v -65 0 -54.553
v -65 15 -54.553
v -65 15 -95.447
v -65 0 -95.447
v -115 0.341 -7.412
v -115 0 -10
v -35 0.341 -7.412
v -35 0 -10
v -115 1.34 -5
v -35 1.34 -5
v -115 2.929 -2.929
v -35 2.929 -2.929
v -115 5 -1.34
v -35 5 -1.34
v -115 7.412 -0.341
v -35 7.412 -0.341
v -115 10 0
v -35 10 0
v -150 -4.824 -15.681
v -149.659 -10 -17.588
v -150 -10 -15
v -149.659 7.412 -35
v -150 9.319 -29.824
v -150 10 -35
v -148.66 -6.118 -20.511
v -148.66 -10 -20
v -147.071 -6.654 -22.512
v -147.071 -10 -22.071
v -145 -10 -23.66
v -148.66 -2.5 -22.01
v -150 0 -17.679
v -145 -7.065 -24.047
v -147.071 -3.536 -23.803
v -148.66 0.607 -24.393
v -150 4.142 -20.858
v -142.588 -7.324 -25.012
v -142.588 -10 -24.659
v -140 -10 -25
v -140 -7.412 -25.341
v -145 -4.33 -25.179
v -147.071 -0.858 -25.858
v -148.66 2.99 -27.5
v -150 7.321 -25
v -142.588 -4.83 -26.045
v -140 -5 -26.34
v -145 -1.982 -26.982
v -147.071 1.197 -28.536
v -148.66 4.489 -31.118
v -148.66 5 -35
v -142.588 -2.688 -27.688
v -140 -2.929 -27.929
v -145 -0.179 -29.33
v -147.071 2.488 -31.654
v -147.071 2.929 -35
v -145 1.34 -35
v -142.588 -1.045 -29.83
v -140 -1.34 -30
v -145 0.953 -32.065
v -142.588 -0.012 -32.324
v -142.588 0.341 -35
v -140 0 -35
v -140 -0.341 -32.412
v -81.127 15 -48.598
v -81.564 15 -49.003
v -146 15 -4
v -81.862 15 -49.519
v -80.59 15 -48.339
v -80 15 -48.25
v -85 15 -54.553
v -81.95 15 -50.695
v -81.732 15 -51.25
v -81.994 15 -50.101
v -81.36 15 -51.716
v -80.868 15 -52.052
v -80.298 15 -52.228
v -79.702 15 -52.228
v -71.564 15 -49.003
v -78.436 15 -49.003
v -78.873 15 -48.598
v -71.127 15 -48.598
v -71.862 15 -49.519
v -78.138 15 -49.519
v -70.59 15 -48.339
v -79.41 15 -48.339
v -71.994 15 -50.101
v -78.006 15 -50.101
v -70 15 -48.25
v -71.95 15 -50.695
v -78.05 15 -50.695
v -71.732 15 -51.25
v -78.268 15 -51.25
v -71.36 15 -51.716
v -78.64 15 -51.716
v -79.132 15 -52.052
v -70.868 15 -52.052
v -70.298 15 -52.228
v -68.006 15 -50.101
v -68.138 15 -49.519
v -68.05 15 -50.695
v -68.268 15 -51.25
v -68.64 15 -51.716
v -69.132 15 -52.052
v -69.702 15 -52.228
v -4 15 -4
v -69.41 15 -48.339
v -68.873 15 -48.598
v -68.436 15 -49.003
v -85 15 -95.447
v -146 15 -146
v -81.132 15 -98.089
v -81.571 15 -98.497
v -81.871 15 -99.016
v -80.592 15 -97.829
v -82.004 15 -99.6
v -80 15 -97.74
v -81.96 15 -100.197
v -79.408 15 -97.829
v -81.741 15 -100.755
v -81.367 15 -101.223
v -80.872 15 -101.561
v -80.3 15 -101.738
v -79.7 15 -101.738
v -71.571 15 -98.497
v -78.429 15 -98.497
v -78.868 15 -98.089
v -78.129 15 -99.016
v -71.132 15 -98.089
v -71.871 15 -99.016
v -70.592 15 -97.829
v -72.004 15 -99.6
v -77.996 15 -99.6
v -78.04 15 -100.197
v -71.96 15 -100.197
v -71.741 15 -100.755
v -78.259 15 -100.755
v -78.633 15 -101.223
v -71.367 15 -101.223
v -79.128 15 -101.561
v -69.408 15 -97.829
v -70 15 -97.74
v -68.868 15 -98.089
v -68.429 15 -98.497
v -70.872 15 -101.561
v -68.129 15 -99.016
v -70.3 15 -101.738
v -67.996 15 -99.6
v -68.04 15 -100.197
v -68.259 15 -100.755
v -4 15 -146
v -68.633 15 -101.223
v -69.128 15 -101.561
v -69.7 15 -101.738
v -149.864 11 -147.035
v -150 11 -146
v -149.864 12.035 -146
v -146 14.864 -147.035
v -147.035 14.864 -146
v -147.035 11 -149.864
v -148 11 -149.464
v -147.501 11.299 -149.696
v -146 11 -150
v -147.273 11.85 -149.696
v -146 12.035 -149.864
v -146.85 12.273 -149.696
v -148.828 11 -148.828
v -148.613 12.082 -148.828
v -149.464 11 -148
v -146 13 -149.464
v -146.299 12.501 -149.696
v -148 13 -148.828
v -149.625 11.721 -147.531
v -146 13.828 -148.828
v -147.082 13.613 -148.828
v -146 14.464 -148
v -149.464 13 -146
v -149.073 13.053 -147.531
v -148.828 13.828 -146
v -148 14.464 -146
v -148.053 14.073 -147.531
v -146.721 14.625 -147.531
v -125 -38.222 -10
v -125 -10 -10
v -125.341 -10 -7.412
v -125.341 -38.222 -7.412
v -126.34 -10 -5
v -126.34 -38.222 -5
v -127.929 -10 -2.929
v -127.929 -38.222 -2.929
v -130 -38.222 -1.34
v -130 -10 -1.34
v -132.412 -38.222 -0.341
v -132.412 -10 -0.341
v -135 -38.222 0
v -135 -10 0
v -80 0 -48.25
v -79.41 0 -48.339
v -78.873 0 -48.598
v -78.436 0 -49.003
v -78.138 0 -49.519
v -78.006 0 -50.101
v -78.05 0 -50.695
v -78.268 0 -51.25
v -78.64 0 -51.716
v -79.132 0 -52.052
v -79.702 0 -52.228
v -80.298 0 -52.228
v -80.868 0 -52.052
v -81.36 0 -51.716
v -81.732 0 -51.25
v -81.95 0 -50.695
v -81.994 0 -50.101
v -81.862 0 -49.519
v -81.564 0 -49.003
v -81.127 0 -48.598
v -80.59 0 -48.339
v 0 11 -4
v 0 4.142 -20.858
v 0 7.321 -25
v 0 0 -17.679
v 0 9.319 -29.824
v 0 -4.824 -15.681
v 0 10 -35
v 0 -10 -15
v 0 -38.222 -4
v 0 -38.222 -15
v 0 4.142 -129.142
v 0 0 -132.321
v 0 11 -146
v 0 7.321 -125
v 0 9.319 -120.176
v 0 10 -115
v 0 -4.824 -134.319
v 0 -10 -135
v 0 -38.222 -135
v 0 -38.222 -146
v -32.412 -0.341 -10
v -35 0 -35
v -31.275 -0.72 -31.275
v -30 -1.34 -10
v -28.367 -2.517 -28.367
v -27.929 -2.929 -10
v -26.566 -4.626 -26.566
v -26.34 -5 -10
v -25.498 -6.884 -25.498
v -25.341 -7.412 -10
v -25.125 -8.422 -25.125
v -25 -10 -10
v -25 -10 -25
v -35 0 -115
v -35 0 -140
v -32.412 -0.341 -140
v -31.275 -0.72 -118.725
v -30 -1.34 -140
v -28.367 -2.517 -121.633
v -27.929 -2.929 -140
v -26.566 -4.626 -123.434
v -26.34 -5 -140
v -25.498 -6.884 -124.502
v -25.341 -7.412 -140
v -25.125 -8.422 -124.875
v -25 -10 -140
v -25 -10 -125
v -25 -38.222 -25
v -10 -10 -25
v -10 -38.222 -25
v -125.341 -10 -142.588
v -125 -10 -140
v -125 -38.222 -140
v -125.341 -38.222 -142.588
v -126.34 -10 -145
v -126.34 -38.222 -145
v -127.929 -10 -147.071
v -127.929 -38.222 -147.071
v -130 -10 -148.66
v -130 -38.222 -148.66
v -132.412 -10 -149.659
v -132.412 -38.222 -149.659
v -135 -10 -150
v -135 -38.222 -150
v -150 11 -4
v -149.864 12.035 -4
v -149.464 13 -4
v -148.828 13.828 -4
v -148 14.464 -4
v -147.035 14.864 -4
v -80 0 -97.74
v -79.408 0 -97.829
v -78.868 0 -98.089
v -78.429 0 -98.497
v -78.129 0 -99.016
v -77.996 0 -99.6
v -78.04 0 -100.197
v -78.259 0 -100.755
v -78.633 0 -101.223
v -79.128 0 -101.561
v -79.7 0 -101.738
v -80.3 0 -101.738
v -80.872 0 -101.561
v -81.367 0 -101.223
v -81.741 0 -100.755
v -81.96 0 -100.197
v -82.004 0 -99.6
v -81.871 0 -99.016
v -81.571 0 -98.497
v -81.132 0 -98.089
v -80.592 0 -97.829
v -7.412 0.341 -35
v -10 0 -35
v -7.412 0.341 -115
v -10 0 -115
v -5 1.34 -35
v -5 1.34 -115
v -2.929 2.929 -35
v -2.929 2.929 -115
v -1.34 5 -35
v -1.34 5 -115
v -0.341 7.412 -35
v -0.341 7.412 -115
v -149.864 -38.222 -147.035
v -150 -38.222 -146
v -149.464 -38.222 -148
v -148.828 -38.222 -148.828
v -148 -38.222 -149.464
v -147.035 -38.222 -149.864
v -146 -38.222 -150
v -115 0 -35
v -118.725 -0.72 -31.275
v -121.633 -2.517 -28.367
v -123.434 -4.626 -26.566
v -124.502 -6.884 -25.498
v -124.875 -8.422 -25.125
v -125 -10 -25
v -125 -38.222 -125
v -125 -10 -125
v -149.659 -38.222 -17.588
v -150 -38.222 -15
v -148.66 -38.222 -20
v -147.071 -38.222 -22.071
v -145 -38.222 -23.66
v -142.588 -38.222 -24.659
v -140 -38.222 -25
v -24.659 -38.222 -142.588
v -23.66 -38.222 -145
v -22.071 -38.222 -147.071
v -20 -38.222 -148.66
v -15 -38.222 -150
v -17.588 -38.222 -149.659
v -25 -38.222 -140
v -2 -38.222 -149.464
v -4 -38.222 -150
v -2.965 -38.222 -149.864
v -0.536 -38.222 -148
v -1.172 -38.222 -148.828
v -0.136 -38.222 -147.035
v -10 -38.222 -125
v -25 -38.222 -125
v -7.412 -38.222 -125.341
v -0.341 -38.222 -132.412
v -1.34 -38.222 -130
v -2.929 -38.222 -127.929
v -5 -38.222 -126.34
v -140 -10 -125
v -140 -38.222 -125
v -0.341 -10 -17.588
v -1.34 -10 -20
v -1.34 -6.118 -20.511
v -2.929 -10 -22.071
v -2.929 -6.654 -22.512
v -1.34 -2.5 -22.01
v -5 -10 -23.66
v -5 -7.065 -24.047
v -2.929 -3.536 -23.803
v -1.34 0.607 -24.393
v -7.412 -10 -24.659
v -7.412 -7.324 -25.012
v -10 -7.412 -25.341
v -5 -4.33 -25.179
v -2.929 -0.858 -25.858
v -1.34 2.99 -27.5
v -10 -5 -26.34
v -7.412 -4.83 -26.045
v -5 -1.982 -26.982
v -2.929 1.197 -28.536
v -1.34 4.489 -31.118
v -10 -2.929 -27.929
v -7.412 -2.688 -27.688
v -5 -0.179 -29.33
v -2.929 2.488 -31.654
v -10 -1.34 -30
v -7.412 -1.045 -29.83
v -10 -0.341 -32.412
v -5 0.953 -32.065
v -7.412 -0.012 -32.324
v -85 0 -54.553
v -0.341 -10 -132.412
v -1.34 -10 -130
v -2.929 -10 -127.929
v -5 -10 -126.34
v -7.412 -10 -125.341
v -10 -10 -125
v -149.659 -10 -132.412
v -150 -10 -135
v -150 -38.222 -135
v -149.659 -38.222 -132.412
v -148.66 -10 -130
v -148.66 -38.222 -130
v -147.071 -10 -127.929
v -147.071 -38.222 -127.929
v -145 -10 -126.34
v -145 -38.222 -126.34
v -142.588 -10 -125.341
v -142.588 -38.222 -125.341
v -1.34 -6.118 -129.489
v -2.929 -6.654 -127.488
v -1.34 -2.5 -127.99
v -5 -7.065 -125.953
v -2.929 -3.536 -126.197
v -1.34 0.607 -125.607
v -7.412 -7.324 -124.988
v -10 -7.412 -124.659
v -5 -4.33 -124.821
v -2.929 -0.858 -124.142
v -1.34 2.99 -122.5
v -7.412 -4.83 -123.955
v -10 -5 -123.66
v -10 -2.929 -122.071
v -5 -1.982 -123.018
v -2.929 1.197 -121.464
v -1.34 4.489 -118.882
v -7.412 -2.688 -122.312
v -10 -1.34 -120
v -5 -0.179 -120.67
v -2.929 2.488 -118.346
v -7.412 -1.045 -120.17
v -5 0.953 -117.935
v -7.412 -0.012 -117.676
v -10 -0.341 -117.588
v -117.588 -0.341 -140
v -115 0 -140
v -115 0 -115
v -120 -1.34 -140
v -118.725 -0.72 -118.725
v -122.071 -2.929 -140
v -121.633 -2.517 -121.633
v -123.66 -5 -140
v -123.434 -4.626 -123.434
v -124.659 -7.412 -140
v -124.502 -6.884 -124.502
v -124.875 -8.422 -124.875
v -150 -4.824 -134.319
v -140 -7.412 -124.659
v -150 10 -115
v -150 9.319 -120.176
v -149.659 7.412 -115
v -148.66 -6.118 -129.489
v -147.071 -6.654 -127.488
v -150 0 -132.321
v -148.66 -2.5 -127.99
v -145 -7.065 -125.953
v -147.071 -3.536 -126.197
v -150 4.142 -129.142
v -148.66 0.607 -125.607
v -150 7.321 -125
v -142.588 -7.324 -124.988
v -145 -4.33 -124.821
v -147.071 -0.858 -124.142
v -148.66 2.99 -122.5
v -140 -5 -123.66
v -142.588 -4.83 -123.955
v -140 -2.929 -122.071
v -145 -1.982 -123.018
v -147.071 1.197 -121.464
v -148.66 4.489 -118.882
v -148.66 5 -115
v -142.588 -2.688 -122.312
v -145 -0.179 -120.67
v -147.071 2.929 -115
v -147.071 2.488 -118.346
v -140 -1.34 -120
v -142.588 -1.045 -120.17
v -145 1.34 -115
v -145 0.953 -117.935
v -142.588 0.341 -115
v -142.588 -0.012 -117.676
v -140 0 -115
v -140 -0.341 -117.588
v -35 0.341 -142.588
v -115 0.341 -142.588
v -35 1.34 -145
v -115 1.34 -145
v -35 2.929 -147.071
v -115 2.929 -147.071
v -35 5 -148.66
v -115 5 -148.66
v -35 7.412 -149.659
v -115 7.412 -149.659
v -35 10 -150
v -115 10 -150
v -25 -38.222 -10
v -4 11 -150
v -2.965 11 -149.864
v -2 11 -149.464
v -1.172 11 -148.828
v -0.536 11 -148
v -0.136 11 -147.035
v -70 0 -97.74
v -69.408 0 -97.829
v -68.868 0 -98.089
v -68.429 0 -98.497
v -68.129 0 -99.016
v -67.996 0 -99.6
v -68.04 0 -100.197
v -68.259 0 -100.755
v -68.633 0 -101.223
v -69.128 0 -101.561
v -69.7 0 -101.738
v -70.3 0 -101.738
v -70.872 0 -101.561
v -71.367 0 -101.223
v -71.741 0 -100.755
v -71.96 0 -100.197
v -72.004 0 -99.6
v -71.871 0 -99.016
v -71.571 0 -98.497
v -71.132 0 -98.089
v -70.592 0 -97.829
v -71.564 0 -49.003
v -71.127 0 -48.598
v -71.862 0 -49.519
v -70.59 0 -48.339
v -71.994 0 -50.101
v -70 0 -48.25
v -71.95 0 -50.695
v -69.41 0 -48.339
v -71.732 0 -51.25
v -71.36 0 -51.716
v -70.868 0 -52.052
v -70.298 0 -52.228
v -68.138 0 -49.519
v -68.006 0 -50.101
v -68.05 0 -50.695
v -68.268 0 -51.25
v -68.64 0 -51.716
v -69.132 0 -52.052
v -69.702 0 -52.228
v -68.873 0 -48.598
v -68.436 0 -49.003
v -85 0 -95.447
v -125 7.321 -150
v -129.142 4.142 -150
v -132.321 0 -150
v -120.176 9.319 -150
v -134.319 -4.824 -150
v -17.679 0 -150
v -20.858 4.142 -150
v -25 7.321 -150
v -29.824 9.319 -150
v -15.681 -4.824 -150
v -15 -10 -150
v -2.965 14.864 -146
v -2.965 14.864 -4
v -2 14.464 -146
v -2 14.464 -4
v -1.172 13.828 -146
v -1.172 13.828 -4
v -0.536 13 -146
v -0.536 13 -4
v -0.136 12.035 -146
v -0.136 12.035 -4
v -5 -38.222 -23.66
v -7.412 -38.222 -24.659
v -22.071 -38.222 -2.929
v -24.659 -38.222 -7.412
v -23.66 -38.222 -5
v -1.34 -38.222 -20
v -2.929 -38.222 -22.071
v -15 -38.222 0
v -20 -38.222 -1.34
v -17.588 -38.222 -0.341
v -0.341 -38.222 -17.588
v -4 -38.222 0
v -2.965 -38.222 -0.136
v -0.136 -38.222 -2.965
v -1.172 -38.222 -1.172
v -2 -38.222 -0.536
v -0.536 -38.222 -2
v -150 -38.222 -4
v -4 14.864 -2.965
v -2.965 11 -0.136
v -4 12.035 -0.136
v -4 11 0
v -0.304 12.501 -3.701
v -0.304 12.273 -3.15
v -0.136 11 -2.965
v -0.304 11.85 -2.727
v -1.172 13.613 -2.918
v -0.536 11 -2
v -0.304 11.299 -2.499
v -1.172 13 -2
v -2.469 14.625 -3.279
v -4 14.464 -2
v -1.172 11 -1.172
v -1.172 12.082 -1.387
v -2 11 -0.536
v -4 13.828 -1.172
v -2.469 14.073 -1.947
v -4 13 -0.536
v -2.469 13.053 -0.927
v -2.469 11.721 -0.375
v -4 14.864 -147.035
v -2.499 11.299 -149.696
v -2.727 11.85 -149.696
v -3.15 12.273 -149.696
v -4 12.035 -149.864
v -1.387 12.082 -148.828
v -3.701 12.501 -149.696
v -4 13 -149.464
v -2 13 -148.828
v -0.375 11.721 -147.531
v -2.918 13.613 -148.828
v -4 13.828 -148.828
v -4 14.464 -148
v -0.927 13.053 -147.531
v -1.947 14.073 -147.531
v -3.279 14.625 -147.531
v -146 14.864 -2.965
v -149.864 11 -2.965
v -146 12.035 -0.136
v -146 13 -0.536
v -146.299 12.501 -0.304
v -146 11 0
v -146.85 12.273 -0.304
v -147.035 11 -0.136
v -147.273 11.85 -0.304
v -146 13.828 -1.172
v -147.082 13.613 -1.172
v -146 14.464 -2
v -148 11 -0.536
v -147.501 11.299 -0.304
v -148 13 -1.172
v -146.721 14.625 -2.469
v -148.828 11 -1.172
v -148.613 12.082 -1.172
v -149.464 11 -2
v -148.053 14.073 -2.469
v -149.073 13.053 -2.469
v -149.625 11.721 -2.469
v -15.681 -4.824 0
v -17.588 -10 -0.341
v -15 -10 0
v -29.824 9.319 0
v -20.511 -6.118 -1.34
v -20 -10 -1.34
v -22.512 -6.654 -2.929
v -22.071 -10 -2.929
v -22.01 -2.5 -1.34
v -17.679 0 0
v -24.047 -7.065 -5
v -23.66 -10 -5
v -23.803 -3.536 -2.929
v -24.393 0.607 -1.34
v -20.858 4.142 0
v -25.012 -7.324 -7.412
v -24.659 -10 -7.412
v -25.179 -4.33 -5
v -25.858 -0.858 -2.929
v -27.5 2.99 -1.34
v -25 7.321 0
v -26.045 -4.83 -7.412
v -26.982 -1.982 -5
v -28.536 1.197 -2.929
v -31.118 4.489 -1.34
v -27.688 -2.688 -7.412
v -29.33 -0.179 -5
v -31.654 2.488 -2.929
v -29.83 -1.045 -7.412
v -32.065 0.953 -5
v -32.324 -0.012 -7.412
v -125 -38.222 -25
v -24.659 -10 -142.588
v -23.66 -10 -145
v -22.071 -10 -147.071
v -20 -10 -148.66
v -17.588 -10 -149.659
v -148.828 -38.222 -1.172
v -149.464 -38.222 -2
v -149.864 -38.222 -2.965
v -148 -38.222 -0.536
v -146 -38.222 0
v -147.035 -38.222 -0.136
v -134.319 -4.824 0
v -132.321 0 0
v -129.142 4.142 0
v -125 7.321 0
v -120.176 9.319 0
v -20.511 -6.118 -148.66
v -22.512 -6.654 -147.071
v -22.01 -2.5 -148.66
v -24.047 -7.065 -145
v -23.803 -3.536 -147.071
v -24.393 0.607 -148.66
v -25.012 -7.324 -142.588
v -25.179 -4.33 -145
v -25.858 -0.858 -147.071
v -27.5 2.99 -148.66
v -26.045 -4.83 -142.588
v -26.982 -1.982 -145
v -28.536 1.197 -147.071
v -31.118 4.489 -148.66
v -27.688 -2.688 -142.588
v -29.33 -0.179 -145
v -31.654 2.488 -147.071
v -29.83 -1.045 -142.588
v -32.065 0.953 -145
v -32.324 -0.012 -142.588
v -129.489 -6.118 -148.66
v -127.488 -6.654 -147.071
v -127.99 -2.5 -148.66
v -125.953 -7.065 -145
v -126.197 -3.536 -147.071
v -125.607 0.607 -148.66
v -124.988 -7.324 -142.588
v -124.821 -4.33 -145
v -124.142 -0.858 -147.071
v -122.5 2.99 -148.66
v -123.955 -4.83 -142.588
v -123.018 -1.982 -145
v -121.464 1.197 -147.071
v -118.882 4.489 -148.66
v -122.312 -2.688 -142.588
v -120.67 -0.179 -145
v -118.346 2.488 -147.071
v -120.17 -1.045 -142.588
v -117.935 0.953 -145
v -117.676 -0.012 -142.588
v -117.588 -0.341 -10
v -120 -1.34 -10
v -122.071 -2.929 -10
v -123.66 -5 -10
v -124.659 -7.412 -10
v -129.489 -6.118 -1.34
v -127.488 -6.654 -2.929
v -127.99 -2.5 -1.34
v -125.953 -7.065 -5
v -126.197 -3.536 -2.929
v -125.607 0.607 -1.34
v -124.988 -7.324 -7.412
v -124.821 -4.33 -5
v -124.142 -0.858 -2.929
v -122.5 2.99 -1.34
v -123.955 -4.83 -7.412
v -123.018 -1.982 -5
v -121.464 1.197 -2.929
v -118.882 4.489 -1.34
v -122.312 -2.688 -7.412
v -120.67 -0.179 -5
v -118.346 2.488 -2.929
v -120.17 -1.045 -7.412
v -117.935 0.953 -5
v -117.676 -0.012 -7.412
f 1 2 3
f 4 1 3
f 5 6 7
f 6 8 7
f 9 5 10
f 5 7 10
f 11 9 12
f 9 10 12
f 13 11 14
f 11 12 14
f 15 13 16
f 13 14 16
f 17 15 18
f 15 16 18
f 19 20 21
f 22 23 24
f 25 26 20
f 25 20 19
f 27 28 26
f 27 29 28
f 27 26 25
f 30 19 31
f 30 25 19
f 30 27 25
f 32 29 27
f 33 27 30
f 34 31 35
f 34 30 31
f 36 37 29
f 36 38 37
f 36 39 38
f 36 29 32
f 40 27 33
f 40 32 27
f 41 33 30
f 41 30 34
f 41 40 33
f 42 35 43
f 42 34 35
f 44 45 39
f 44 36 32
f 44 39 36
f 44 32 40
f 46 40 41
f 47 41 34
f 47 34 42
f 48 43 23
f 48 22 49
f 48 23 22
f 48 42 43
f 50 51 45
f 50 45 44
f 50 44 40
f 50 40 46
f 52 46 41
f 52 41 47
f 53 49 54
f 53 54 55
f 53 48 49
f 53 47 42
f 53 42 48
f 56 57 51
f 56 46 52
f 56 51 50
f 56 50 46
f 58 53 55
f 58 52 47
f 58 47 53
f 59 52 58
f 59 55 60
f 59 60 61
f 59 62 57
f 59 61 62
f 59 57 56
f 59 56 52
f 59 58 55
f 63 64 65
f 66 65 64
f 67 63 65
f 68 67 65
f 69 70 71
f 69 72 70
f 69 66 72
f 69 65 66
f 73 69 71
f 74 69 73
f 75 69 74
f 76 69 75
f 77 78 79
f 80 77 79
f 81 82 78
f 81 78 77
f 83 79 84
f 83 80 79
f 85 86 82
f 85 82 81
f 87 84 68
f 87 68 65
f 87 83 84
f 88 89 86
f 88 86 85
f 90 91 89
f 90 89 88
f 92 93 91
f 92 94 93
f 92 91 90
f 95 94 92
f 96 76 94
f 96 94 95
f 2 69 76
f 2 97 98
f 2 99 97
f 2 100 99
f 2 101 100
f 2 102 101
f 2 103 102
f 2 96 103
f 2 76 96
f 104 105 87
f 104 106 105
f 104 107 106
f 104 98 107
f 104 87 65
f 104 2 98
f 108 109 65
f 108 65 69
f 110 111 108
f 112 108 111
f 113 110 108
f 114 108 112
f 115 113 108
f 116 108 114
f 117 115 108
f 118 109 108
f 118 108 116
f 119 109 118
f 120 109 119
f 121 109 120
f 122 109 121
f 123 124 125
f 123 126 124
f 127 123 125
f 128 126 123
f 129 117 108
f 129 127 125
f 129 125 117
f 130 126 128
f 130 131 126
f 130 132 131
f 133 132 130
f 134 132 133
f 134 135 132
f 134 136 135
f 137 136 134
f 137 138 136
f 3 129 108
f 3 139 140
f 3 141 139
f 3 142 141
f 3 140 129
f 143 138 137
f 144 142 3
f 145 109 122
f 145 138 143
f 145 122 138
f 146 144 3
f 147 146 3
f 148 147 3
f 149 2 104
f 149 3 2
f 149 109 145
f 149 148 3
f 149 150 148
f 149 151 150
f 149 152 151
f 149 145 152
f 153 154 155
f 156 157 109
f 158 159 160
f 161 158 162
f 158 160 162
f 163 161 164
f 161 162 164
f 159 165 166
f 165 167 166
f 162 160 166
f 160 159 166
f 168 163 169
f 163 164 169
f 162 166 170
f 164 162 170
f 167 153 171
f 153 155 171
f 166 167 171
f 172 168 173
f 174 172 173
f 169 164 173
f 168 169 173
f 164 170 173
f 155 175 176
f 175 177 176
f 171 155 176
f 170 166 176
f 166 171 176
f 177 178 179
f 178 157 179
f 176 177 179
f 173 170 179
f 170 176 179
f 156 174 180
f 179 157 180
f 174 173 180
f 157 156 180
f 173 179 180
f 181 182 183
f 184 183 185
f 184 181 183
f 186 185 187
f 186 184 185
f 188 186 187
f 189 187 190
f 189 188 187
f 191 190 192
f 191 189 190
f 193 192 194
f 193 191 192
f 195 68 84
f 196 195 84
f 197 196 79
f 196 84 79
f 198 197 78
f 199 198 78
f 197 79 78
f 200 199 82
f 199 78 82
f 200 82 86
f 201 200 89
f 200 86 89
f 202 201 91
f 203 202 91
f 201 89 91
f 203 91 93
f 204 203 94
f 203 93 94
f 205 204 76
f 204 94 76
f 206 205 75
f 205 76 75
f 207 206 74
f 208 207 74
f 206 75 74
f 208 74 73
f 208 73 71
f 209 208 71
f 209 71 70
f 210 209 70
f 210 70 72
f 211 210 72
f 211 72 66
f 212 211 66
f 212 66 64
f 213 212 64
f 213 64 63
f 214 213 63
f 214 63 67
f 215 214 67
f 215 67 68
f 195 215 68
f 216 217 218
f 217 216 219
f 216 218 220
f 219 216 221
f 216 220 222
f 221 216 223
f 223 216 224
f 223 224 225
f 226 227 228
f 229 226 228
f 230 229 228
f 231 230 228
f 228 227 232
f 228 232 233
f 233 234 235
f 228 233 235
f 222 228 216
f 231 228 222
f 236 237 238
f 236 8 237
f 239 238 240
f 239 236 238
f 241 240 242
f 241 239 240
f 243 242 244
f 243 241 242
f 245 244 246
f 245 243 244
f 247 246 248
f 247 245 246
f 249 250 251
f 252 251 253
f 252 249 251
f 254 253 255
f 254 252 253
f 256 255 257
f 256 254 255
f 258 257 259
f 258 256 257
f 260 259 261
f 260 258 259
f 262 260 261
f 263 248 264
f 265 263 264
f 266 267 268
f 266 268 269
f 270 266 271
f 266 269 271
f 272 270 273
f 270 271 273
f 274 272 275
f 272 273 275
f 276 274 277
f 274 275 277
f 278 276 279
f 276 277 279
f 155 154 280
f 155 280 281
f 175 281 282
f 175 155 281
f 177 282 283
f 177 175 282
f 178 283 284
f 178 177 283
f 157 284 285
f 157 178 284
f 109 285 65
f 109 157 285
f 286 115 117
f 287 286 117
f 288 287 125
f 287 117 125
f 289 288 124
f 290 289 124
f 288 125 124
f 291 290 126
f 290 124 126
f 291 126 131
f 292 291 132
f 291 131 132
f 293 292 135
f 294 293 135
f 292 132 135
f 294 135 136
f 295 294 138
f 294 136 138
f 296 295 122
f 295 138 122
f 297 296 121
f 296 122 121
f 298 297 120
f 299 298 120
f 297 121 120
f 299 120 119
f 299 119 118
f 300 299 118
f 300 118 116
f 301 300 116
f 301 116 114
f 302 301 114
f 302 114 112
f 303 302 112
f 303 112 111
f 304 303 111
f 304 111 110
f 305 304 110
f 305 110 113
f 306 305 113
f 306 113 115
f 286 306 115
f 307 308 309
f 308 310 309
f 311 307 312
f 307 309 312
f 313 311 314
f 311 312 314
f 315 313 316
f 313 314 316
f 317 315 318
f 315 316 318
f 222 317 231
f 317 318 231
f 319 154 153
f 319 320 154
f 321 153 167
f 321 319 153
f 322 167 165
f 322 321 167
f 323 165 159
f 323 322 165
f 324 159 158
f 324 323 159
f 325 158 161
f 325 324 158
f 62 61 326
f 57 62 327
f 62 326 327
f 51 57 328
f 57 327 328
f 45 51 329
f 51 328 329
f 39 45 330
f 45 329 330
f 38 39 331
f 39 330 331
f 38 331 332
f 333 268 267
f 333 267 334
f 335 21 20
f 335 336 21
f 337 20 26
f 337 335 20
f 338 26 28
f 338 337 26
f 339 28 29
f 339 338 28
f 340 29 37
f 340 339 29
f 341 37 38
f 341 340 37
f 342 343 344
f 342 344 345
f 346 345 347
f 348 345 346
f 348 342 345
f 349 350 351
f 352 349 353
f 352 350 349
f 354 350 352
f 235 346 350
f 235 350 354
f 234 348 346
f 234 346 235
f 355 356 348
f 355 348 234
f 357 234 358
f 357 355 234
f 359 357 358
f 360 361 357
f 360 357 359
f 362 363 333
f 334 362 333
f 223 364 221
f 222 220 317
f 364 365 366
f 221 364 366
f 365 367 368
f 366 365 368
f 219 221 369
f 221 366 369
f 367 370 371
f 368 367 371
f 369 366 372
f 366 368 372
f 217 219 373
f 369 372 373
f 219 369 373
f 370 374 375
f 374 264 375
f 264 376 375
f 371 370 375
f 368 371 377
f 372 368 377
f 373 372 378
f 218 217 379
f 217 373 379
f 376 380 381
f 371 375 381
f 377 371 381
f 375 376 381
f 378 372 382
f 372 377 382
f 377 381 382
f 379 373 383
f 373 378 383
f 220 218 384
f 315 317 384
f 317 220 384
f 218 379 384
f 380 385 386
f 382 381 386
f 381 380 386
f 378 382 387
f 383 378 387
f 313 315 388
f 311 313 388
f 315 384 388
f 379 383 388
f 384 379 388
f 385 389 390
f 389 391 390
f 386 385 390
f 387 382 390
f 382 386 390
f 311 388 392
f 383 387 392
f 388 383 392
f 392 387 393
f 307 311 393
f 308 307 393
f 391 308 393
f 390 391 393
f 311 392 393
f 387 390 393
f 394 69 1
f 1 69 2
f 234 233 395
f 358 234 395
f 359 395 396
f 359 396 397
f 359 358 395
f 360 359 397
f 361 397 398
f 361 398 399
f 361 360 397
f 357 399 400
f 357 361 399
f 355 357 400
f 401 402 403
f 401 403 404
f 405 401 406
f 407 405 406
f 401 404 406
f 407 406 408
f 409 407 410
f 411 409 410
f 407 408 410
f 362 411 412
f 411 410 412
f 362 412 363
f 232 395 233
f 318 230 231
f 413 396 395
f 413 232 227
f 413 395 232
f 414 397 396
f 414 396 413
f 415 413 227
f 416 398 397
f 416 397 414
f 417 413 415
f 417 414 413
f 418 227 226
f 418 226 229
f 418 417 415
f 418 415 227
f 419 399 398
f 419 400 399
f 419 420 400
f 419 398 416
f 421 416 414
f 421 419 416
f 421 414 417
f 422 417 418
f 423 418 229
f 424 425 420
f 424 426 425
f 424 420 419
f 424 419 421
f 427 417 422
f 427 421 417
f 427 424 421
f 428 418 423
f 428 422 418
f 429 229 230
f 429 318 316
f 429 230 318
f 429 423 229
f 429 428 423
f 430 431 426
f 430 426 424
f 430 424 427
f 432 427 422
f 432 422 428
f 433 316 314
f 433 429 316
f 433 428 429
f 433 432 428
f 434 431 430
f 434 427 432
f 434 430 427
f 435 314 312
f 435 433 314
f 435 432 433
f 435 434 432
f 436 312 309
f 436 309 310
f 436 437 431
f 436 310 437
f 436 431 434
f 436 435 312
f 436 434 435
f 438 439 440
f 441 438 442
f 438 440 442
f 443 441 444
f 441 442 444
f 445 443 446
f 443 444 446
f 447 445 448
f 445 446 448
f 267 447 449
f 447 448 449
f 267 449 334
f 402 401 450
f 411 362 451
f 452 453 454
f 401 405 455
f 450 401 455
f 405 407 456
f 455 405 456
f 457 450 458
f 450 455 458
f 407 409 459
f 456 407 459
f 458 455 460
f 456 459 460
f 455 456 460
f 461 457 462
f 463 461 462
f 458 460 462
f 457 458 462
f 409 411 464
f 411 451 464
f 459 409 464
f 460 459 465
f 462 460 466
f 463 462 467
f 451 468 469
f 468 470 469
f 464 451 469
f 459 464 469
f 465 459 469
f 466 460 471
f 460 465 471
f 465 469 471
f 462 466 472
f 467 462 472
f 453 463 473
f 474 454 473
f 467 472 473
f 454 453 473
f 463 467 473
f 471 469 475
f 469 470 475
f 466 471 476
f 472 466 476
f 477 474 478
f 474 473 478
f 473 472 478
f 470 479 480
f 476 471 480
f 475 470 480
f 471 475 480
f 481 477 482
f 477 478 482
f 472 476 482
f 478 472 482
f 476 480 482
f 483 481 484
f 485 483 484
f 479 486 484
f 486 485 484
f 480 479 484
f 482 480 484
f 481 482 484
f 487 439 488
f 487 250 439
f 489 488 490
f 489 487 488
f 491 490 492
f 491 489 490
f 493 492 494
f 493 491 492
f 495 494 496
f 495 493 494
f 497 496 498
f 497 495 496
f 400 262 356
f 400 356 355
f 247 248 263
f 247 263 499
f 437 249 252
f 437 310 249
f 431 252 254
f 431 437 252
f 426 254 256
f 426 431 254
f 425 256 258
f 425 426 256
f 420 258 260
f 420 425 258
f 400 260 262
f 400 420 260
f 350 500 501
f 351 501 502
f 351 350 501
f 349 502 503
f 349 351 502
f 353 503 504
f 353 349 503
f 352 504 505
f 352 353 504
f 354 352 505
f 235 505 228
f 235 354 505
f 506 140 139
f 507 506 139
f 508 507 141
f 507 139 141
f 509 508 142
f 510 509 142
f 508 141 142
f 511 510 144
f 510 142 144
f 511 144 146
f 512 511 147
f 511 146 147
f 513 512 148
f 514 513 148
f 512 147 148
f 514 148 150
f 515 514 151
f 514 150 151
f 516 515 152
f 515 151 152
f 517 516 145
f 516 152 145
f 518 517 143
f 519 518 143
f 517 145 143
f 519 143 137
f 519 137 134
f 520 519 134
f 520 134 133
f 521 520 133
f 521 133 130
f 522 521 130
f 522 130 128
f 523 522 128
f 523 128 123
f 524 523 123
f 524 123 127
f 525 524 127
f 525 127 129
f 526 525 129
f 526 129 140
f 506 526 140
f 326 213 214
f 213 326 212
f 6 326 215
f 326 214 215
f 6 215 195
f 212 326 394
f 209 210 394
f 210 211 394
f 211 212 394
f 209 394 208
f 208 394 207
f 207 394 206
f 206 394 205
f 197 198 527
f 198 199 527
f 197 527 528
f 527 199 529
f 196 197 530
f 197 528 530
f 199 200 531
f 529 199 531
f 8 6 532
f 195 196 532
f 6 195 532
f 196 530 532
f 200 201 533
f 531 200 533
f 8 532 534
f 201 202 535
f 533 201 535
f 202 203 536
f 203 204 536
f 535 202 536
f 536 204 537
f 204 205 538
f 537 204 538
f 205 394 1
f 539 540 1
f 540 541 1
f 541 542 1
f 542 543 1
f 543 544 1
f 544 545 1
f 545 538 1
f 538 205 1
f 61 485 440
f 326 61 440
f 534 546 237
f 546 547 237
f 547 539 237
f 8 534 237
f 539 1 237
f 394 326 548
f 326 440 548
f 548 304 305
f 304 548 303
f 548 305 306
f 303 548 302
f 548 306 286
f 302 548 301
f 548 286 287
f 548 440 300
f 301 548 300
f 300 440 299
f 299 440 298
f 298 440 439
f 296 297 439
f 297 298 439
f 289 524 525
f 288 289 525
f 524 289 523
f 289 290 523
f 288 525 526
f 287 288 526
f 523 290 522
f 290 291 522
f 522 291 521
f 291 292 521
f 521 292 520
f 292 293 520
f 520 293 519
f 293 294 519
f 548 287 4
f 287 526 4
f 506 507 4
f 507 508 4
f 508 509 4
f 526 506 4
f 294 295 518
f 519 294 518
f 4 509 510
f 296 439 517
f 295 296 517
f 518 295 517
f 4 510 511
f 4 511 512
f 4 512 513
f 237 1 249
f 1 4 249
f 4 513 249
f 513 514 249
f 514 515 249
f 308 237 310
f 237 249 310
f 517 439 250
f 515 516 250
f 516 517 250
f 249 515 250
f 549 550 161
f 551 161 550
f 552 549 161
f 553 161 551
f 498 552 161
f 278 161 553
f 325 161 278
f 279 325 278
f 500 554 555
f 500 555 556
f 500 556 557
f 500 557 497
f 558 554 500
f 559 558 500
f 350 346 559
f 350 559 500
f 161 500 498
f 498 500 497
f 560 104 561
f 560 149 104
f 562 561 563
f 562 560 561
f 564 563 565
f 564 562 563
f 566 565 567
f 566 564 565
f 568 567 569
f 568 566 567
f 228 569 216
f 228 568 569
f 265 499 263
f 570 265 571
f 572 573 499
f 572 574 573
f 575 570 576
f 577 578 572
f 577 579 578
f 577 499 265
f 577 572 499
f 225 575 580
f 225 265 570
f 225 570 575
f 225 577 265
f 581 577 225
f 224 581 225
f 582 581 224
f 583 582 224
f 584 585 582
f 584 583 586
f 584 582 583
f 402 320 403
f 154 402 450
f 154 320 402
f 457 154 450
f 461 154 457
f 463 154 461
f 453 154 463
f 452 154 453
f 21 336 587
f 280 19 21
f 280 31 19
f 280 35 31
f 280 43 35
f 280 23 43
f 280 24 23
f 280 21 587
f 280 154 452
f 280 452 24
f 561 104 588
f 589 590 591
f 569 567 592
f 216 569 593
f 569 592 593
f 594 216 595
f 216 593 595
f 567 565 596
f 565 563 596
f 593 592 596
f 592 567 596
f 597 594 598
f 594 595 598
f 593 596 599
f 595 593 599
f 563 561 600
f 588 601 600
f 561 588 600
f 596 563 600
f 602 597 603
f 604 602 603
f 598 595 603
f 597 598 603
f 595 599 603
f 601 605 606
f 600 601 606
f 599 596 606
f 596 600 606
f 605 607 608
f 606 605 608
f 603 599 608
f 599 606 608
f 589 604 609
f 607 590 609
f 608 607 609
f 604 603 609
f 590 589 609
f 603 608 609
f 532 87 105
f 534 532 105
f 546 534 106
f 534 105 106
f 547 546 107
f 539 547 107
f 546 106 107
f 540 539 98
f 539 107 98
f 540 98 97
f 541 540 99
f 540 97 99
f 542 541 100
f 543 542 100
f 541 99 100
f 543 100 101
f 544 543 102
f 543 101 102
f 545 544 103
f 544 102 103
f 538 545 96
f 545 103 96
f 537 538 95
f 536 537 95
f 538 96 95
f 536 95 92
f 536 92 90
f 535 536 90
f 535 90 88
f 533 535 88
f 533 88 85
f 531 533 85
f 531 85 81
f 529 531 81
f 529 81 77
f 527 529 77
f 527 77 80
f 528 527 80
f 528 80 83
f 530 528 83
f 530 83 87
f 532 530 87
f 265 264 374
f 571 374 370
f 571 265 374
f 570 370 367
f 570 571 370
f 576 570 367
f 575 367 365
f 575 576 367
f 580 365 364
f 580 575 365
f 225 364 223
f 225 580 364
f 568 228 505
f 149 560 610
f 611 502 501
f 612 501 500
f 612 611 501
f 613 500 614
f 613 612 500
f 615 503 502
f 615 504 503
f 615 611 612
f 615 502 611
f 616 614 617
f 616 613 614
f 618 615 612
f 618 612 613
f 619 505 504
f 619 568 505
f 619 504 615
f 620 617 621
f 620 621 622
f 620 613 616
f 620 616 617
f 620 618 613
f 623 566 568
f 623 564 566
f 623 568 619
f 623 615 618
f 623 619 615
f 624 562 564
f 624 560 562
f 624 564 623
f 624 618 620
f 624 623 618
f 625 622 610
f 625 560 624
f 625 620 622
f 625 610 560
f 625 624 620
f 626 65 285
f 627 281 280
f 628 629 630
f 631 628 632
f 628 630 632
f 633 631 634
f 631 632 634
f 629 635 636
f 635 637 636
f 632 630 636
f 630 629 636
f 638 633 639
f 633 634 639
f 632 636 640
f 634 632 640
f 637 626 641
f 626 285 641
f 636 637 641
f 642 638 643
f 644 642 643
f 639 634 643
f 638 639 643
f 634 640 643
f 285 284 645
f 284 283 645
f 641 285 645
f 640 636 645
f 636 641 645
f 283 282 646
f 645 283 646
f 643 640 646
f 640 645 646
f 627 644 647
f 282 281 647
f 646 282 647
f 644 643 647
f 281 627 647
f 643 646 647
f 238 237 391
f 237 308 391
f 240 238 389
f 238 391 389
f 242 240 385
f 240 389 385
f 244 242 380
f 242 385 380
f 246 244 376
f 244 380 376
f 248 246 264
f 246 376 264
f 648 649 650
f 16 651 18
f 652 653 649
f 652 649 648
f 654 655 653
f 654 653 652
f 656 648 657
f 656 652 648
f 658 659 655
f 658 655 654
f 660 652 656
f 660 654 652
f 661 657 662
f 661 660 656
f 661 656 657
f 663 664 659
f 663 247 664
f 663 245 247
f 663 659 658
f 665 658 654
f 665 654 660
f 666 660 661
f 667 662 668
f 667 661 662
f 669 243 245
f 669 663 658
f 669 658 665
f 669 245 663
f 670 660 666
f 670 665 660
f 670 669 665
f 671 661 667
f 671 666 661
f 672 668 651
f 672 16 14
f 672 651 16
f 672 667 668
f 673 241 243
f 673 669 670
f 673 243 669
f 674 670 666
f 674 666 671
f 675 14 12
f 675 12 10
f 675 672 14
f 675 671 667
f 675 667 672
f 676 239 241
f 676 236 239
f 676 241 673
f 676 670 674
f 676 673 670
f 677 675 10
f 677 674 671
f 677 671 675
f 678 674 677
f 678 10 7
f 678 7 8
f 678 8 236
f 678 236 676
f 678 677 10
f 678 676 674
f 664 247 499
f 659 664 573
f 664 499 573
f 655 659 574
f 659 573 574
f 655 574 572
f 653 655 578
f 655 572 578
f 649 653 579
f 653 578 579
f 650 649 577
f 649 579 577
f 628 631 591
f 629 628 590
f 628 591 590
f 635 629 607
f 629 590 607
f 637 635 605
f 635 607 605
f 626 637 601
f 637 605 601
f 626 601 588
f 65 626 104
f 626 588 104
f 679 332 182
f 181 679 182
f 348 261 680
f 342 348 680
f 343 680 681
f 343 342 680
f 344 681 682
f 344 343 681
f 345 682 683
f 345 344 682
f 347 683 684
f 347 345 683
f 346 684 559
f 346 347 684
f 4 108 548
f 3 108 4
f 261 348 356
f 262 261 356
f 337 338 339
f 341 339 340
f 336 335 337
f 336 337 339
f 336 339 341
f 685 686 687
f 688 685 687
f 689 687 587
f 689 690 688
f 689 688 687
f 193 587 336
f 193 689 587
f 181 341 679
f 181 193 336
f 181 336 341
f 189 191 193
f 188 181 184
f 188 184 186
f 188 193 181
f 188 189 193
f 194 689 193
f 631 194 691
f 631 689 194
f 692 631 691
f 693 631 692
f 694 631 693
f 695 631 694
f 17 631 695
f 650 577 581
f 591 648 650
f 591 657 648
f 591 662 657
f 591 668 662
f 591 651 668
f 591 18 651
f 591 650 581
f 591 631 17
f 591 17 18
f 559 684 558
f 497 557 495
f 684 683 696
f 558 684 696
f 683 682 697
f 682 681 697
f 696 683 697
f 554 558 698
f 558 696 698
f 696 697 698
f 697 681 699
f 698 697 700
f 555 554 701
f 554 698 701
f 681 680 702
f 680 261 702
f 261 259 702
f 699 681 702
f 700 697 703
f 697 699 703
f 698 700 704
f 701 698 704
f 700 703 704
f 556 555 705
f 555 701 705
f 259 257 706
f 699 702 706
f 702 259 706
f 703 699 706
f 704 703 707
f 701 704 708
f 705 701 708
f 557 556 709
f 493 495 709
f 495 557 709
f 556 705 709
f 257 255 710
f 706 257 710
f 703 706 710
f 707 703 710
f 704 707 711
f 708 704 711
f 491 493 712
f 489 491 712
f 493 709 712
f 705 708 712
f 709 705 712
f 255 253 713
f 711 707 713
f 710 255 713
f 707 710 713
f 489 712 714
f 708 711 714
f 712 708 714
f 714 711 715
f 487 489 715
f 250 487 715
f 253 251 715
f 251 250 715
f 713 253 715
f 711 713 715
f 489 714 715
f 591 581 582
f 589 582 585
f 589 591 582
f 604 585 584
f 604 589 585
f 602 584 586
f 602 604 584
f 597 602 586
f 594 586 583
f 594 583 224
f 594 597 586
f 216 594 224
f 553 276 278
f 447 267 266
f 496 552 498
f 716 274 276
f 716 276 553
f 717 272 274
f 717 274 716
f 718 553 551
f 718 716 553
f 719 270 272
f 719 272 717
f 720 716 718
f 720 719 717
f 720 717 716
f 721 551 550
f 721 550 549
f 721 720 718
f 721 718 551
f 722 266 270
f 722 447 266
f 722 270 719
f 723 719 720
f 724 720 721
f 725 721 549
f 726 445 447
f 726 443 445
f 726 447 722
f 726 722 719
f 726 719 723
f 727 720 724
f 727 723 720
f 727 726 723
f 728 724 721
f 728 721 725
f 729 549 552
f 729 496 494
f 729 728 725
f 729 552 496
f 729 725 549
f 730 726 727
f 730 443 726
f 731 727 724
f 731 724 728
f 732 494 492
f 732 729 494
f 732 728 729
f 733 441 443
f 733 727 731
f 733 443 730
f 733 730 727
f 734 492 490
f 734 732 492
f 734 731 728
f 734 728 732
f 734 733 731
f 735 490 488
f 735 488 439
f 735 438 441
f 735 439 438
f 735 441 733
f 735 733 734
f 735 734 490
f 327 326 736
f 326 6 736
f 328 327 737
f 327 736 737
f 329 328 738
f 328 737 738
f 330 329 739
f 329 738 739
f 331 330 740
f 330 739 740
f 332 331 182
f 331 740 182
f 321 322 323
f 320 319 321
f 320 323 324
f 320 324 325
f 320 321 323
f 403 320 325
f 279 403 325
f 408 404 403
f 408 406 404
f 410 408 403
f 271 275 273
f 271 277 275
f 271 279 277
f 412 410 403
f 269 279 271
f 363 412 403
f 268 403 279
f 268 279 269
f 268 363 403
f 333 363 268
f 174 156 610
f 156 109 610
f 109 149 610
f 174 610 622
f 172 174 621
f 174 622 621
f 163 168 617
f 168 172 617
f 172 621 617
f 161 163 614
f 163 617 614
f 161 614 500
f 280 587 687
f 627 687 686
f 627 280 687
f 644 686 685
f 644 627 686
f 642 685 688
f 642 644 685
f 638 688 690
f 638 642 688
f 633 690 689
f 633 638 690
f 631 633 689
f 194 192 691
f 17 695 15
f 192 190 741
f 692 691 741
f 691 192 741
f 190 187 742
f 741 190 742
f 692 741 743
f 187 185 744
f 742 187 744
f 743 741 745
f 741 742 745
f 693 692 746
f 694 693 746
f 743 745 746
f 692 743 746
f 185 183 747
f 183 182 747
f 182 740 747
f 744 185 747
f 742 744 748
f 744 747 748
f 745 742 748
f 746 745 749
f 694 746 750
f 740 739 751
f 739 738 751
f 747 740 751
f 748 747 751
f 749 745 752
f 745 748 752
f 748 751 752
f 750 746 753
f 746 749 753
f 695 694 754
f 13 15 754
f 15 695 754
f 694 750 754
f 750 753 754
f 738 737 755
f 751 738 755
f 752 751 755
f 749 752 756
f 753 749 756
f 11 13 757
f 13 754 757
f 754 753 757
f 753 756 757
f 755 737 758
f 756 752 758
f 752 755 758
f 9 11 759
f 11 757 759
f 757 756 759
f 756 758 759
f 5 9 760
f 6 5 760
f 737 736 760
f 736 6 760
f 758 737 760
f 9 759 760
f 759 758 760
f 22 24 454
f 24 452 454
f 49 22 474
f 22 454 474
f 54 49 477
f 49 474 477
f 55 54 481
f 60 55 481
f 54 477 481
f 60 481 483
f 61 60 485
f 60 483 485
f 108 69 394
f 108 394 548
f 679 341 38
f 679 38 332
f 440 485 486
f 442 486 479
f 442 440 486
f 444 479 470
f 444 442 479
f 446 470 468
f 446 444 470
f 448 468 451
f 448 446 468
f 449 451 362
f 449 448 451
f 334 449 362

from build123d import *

# Parameters (mm, degrees)
SKETCH1_W           = 150
SKETCH1_H           = 150
BOSS_EXTRUDE1_DEPTH = 15
SKETCH2_W           = 20.0000108
SKETCH2_H           = 40.894
CUT_EXTRUDE1_DEPTH  = 15
SKETCH4_W           = 25
SKETCH4_H           = 25
BOSS_EXTRUDE2_DEPTH = 38.222
FILLET1_R           = 10
FILLET2_R           = 4
SKETCH5_R           = 2
SKETCH5_R_2         = 2.01
CUT_EXTRUDE2_DEPTH  = 53.222


with BuildPart() as part:
    # Sketch1 → Boss-Extrude1 (new body)
    with BuildSketch(Plane(origin=(0, 0, 0), x_dir=(1, 0, 0), z_dir=(0, 1, 0))):
        with Locations((-75, 75)):
            Rectangle(SKETCH1_W, SKETCH1_H)
    extrude(amount=BOSS_EXTRUDE1_DEPTH)

    # Sketch2 → Cut-Extrude1 (cut)
    with BuildSketch(Plane(origin=(0, 15, 0), x_dir=(1, 0, 0), z_dir=(0, 1, 0))):
        with Locations((-75, 75)):
            Rectangle(SKETCH2_W, SKETCH2_H)
    extrude(amount=-CUT_EXTRUDE1_DEPTH, mode=Mode.SUBTRACT)

    # Sketch4 → Boss-Extrude2 (add)
    with BuildSketch(Plane.XZ):
        with Locations((-137.5, -12.5)):
            Rectangle(SKETCH4_W, SKETCH4_H)
        with Locations((-137.5, -137.5)):
            Rectangle(SKETCH4_W, SKETCH4_H)
        with Locations((-12.5, -12.5)):
            Rectangle(SKETCH4_W, SKETCH4_H)
        with Locations((-12.5, -137.5)):
            Rectangle(SKETCH4_W, SKETCH4_H)
    extrude(amount=BOSS_EXTRUDE2_DEPTH)

    # Fillet1
    fillet1_edges = [part.edges().sort_by_distance(p)[0] for p in [
        (-75, 0, 0),
        (-137.5, 0, -25),
        (-150, -19.111, -25),
        (-125, 0, -12.5),
        (-125, -19.111, 0),
        (-150, 0, -75),
        (-125, 0, -137.5),
        (-125, -19.111, -150),
        (-137.5, 0, -125),
        (-150, -19.111, -125),
        (0, 0, -75),
        (-25, 0, -12.5),
        (-25, -19.111, 0),
        (-12.5, 0, -25),
        (0, -19.111, -25),
        (-75, 0, -150),
        (-12.5, 0, -125),
        (0, -19.111, -125),
        (-25, 0, -137.5),
        (-25, -19.111, -150),
    ]]
    fillet(fillet1_edges, radius=FILLET1_R)

    # Fillet2
    fillet2_edges = [part.edges().sort_by_distance(p)[0] for p in [
        (-150, 15, -75),
        (-75, 15, 0),
        (0, 15, -75),
        (0, -11.611, 0),
        (-150, -11.611, 0),
        (-150, -11.611, -150),
        (0, -11.611, -150),
        (-75, 15, -150),
    ]]
    fillet(fillet2_edges, radius=FILLET2_R)

    # Sketch5 → Cut-Extrude2 (cut)
    with BuildSketch(Plane(origin=(0, 15, 0), x_dir=(1, 0, 0), z_dir=(0, 1, 0))):
        with Locations(Location((-80, 50.25, 0), (0, 0, 270))):
            Circle(SKETCH5_R)
        with Locations(Location((-70, 50.25, 0), (0, 0, 270))):
            Circle(SKETCH5_R)
        with Locations(Location((-80, 99.75, 0), (0, 0, 270))):
            Circle(SKETCH5_R_2)
        with Locations(Location((-70, 99.75, 0), (0, 0, 270))):
            Circle(SKETCH5_R_2)
    extrude(amount=-CUT_EXTRUDE2_DEPTH, mode=Mode.SUBTRACT)


solid = part.part
